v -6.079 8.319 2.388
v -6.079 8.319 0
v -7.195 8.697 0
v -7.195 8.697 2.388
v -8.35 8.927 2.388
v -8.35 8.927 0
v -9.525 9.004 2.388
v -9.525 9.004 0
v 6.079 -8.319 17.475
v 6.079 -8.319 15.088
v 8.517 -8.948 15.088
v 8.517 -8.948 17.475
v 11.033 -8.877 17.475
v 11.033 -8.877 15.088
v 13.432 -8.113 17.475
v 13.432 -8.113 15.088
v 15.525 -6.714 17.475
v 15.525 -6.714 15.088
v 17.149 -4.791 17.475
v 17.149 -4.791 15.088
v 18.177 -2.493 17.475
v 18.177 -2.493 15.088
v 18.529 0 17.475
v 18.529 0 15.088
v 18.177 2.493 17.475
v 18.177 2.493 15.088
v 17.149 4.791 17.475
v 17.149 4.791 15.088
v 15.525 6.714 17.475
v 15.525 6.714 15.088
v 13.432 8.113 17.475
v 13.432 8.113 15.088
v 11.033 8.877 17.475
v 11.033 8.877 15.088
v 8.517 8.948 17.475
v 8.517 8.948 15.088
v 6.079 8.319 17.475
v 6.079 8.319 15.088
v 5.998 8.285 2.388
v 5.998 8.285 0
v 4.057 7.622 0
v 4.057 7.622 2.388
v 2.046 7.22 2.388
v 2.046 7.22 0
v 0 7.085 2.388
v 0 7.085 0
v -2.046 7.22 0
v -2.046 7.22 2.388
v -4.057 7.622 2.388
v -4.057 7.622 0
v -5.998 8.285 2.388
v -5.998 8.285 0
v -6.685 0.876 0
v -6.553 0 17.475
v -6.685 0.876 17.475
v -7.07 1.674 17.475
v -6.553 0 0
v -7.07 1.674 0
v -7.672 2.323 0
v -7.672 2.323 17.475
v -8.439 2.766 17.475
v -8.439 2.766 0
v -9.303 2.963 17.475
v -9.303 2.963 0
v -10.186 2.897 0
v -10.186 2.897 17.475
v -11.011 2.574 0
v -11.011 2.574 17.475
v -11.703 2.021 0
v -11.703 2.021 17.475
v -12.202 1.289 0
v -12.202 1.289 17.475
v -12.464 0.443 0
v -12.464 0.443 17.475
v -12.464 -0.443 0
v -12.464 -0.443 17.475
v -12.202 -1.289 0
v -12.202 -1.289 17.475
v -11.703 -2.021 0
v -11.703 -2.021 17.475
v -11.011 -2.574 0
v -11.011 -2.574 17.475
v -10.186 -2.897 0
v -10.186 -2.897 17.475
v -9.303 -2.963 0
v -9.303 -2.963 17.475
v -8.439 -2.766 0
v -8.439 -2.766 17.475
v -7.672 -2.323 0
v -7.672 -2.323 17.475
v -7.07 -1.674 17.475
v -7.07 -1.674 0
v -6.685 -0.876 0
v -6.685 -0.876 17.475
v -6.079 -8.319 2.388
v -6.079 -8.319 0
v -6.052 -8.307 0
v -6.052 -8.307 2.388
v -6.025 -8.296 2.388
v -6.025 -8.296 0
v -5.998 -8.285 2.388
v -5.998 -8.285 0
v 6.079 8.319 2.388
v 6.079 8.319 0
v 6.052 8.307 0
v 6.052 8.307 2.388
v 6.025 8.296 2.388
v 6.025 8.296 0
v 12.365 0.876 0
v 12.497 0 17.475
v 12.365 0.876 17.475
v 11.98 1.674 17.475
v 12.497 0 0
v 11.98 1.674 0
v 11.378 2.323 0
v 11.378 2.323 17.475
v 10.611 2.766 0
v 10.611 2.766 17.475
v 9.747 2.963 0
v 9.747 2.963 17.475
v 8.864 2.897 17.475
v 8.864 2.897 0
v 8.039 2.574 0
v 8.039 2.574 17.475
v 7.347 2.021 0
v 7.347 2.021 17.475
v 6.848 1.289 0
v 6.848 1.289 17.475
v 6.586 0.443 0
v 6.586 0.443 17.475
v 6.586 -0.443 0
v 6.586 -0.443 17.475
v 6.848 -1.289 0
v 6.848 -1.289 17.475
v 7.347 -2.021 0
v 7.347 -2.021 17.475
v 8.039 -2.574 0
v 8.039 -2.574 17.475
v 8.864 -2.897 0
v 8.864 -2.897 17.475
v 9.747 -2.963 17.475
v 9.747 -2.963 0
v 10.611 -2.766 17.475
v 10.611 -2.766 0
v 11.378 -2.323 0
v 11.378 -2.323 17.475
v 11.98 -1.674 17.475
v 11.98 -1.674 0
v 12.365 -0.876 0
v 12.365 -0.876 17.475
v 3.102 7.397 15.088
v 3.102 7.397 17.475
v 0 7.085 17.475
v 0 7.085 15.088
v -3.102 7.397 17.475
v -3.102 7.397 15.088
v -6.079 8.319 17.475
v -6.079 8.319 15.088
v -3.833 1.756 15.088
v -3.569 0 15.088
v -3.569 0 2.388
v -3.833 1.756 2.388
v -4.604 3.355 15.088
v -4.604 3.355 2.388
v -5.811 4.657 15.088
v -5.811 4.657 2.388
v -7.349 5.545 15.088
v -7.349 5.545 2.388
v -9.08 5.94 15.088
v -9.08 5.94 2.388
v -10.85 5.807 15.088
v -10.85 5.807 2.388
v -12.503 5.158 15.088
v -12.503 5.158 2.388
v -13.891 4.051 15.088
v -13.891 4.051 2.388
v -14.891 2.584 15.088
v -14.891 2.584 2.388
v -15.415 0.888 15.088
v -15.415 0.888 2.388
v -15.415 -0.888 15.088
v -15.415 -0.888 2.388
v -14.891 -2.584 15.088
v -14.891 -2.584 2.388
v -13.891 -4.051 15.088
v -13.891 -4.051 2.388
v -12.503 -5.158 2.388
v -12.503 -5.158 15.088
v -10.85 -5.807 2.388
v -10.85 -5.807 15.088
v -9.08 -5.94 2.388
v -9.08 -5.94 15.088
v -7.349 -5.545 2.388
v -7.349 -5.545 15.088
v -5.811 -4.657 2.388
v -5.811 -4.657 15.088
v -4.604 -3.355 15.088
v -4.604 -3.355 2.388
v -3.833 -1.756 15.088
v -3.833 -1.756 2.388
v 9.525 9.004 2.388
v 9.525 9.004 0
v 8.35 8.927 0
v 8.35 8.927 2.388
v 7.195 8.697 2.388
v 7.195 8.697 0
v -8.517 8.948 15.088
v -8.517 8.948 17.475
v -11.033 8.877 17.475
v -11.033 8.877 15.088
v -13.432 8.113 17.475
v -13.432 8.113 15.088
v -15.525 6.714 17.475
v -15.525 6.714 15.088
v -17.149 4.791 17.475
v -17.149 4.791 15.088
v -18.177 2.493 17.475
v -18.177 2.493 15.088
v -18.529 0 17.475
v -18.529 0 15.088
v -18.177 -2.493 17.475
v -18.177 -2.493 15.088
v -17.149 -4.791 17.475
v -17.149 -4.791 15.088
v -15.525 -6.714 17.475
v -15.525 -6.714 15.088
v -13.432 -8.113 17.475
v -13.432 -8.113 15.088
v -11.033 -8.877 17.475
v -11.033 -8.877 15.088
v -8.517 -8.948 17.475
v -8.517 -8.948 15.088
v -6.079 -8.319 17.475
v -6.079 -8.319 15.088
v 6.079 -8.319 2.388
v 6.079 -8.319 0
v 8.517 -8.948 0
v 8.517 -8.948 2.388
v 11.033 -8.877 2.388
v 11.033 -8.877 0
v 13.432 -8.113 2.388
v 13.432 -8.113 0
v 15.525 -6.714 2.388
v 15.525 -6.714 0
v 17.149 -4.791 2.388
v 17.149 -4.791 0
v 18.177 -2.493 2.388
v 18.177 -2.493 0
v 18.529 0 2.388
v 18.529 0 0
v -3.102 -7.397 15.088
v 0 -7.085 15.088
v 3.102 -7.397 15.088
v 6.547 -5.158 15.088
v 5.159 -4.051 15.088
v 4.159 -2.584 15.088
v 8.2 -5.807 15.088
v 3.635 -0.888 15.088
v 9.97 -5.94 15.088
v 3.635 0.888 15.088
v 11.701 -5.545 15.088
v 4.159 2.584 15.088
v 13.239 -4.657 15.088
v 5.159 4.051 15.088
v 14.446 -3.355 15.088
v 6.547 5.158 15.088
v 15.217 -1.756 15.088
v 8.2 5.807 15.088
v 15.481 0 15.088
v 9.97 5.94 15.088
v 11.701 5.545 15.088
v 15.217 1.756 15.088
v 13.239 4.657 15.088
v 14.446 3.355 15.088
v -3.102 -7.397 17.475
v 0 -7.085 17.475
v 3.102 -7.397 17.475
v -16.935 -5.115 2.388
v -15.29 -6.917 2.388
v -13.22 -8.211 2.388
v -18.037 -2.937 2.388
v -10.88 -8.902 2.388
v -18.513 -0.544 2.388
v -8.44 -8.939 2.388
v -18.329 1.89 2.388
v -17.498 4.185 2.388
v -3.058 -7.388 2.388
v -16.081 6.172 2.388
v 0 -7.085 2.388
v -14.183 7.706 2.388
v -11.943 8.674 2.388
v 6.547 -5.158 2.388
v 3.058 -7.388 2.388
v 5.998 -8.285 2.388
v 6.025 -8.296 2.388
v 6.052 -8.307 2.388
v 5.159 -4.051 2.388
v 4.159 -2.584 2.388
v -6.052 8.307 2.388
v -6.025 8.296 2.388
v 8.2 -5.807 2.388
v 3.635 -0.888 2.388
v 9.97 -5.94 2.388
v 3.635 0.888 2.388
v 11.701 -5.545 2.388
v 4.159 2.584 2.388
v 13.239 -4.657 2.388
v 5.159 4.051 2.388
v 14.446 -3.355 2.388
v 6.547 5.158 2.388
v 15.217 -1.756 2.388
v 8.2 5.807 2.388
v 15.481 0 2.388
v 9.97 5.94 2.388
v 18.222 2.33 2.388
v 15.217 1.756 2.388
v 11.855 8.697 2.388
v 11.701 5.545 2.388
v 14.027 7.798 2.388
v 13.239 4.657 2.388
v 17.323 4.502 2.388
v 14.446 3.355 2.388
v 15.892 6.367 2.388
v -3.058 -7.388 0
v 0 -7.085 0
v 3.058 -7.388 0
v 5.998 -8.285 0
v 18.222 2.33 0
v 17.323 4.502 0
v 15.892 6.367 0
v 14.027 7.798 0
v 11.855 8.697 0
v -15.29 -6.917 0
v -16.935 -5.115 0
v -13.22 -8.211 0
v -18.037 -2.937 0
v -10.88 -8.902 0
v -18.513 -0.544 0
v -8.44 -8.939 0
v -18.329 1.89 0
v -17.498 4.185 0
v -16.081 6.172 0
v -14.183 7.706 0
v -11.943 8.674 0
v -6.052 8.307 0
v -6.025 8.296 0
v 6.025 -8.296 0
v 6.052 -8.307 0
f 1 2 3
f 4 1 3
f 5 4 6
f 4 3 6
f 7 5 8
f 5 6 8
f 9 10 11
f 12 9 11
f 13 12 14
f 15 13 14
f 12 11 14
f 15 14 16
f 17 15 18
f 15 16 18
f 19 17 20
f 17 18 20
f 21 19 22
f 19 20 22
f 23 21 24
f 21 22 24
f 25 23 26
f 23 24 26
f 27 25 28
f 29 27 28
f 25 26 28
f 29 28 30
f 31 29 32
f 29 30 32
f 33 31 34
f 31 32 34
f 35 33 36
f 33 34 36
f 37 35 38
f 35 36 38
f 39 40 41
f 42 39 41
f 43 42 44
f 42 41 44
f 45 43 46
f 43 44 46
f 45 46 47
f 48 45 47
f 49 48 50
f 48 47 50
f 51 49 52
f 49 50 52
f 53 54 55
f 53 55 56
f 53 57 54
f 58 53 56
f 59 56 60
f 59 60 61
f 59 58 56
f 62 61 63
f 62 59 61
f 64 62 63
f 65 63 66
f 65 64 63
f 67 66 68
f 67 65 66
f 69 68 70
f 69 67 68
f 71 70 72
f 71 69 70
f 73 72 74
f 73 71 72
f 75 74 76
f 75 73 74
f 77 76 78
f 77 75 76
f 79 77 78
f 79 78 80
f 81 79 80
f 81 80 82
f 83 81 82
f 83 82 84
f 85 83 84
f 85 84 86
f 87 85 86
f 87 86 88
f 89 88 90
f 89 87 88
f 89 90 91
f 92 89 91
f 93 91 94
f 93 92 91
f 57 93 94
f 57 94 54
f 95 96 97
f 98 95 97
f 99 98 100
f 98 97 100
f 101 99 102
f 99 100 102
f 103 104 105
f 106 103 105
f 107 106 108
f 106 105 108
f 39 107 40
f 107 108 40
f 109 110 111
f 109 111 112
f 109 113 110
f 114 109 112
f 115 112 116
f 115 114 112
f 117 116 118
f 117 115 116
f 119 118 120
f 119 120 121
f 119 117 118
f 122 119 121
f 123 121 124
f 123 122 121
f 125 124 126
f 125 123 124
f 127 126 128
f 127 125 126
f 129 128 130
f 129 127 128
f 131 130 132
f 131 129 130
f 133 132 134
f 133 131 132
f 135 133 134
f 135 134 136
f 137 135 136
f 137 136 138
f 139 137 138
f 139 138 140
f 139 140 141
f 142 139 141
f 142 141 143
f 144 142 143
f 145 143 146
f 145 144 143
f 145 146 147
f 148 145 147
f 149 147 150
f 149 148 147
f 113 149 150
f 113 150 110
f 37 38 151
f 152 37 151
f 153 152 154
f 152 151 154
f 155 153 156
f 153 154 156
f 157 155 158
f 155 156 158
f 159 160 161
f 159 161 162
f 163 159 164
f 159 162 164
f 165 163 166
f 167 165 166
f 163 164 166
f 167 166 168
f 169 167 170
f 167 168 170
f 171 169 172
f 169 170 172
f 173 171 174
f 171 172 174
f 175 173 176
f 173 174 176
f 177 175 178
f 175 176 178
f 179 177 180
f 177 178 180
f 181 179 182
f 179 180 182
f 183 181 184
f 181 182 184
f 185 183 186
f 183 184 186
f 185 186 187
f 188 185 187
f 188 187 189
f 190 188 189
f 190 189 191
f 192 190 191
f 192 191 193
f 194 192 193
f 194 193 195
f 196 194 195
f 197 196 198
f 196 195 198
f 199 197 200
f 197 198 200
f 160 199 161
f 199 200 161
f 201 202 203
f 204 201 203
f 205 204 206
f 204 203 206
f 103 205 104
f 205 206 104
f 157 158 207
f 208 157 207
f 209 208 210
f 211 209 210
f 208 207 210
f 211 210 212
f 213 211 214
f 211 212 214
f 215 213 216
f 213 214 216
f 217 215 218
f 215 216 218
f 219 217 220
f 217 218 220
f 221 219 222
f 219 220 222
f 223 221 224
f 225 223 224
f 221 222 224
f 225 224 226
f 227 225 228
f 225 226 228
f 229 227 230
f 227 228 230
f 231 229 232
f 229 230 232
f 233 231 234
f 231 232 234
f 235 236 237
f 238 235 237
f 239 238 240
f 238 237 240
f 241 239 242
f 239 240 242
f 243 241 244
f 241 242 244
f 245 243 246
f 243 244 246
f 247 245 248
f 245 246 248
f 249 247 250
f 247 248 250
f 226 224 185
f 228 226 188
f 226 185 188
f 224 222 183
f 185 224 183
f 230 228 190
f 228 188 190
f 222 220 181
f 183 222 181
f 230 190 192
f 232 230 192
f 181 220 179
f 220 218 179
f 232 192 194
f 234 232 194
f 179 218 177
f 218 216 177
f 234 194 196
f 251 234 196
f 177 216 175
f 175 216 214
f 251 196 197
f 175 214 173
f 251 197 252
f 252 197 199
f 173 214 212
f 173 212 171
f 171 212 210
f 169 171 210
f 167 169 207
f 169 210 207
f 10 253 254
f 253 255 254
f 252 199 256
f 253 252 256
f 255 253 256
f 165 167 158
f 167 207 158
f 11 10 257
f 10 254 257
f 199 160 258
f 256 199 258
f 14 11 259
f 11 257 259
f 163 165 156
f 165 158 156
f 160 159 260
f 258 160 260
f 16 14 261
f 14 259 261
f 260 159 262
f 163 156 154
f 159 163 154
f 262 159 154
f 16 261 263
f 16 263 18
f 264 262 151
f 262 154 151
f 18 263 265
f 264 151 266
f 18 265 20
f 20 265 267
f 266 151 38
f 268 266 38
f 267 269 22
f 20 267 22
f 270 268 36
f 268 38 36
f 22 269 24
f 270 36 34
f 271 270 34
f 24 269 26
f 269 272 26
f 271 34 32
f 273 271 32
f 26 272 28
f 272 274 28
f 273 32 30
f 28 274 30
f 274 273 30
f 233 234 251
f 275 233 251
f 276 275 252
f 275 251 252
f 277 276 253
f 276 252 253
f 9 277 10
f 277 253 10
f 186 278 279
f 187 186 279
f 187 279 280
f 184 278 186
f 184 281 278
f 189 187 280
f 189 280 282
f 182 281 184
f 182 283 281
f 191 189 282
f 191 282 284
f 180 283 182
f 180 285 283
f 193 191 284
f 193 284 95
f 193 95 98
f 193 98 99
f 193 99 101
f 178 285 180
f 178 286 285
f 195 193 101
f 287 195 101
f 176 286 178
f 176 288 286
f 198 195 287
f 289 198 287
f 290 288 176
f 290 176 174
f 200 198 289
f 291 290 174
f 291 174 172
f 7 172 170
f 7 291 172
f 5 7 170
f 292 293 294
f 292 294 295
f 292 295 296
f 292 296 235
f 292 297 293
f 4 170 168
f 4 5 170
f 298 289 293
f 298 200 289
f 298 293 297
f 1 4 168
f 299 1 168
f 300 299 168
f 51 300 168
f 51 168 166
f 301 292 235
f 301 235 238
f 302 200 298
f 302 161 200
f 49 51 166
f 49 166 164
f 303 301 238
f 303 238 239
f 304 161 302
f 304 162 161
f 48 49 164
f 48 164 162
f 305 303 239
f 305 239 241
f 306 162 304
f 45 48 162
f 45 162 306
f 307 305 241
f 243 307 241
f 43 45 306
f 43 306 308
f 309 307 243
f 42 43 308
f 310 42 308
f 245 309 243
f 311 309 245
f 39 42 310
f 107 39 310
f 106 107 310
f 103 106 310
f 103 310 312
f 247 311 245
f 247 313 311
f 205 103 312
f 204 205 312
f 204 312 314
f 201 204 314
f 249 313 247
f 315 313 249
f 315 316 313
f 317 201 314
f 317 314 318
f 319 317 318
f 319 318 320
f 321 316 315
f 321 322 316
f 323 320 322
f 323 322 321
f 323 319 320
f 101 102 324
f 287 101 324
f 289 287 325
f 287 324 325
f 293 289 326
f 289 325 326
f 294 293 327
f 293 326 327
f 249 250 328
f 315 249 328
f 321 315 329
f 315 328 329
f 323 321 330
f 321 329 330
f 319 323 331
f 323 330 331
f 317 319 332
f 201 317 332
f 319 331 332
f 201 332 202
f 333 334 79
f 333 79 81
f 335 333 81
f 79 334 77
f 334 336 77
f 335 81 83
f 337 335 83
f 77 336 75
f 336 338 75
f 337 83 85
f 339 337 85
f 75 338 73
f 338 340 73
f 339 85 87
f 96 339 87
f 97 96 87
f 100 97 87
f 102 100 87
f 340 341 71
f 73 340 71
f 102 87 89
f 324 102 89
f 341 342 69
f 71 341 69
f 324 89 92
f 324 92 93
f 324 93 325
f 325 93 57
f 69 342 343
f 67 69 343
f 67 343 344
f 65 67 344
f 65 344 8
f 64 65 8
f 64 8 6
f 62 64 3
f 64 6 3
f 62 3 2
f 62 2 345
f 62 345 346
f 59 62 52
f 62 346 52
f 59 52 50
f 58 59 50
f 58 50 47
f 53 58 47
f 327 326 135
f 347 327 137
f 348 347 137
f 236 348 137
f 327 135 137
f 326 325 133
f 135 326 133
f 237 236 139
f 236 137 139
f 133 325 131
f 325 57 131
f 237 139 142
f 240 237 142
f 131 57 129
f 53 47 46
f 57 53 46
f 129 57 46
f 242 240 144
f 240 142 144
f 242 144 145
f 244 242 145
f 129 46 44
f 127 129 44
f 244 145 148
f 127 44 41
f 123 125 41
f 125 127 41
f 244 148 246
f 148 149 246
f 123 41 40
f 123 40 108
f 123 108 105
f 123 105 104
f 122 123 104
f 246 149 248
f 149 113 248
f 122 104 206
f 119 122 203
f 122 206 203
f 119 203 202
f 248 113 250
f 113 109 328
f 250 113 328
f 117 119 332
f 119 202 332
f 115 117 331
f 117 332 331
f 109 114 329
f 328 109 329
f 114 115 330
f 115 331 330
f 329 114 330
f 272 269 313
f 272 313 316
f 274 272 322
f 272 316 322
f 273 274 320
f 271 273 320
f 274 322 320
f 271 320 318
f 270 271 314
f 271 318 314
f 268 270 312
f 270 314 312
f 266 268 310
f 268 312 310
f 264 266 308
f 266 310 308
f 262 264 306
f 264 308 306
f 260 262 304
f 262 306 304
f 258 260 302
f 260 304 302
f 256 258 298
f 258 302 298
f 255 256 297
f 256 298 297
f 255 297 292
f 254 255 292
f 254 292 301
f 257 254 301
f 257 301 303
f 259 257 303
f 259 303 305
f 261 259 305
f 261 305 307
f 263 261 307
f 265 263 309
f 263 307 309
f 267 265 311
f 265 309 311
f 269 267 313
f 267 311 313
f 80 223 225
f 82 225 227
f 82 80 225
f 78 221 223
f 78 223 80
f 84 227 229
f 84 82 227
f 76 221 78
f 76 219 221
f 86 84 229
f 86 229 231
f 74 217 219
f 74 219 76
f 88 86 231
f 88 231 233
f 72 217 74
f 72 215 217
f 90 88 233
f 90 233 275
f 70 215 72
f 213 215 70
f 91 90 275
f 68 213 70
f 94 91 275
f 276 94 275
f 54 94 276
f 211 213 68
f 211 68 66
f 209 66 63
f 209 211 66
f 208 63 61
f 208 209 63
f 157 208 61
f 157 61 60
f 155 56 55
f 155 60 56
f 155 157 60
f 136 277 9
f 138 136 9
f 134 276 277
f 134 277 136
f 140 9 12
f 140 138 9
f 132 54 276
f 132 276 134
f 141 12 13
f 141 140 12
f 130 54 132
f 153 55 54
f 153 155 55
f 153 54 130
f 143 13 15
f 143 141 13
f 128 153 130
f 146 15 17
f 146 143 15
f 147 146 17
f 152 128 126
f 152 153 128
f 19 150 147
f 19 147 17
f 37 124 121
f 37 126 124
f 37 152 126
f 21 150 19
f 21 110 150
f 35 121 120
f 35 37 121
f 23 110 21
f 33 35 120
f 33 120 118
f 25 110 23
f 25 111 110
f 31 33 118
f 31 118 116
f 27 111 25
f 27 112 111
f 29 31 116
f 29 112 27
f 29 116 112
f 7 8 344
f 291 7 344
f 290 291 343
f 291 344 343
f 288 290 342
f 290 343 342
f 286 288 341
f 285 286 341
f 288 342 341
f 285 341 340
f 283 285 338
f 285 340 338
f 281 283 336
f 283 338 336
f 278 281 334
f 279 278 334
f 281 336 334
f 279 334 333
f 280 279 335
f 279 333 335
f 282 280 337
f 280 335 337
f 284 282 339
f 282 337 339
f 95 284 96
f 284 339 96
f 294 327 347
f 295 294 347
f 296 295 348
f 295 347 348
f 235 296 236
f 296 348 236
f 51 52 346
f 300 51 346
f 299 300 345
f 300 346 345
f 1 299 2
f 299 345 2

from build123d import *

# Parameters (mm, degrees)
SKETCH1_R           = 2.9718
BOSS_EXTRUDE1_DEPTH = 2.3876
SKETCH2_R           = 5.9563
SKETCH2_R_2         = 2.9718
BOSS_EXTRUDE2_DEPTH = 12.7
SKETCH3_R           = 2.9718
BOSS_EXTRUDE3_DEPTH = 2.3876


with BuildPart() as part:
    # Sketch1 → Boss-Extrude1 (new body)
    # profile 1 of 7: a face of its own
    with BuildSketch(Plane.XY):
        with BuildLine():
            Line((-5.02285, 4.50215), (-9.525, 9.0043))
            ThreePointArc((-9.525, 9.0043), (-18.3562849, -1.756651787), (-6.07920357, -8.318888475))
            ThreePointArc((-6.07920357, -8.318888475), (-6.038523344, -8.30173624), (-5.997794724, -8.284699236))
            ThreePointArc((-5.997794724, -8.284699236), (-2.013760656, -4.965752915), (-0.5207, 0))
            Line((-0.5207, 0), (-5.02285, 4.50215))
        make_face()
        with Locations((-9.525, 0)):
            Circle(SKETCH1_R, mode=Mode.SUBTRACT)
    # profile 2 of 7: a face of its own
    with BuildSketch(Plane.XY):
        with BuildLine():
            ThreePointArc((-6.07920357, 8.318888475), (-7.768348213, 8.8312849), (-9.525, 9.0043))
            Line((-9.525, 9.0043), (-5.02285, 4.50215))
            Line((-5.02285, 4.50215), (-3.15799841, 6.36700159))
            ThreePointArc((-3.15799841, 6.36700159), (-4.485831076, 7.462184335), (-5.997794724, 8.284699236))
            ThreePointArc((-5.997794724, 8.284699236), (-6.038523344, 8.30173624), (-6.07920357, 8.318888475))
        make_face()
    # profile 3 of 7: a face of its own
    with BuildSketch(Plane.XY):
        with BuildLine():
            ThreePointArc((-3.15799841, 6.36700159), (-1.206111525, 3.44579643), (-0.5207, 0))
            ThreePointArc((-0.5207, 0), (-2.013760656, -4.965752915), (-5.997794724, -8.284699236))
            ThreePointArc((-5.997794724, -8.284699236), (0, -7.08520242), (5.997794724, -8.284699236))
            ThreePointArc((5.997794724, -8.284699236), (0.685208337, -1.713330628), (3.15799841, 6.36700159))
            Line((3.15799841, 6.36700159), (0, 6.36700159))
            Line((0, 6.36700159), (-3.15799841, 6.36700159))
        make_face()
    # profile 4 of 7: a face of its own
    with BuildSketch(Plane.XY):
        with BuildLine():
            Line((-3.15799841, 6.36700159), (-5.02285, 4.50215))
            Line((-5.02285, 4.50215), (-0.5207, 0))
            ThreePointArc((-0.5207, 0), (-1.206111525, 3.44579643), (-3.15799841, 6.36700159))
        make_face()
    # profile 5 of 7: a face of its own
    with BuildSketch(Plane.XY):
        with BuildLine():
            ThreePointArc((-5.997794724, 8.284699236), (-4.485831076, 7.462184335), (-3.15799841, 6.36700159))
            Line((-3.15799841, 6.36700159), (0, 6.36700159))
            Line((0, 6.36700159), (0, 7.08520242))
            ThreePointArc((0, 7.08520242), (-3.058281141, 7.388016551), (-5.997794724, 8.284699236))
        make_face()
    # profile 6 of 7: a face of its own
    with BuildSketch(Plane.XY):
        with BuildLine():
            ThreePointArc((5.997794724, 8.284699236), (3.058281141, 7.388016551), (0, 7.08520242))
            Line((0, 7.08520242), (0, 6.36700159))
            Line((0, 6.36700159), (3.15799841, 6.36700159))
            ThreePointArc((3.15799841, 6.36700159), (4.485831076, 7.462184335), (5.997794724, 8.284699236))
        make_face()
    # profile 7 of 7: a face of its own
    with BuildSketch(Plane.XY):
        with BuildLine():
            ThreePointArc((18.5293, 0), (15.89200159, 6.36700159), (9.525, 9.0043))
            ThreePointArc((9.525, 9.0043), (7.768348213, 8.8312849), (6.07920357, 8.318888475))
            ThreePointArc((6.07920357, 8.318888475), (6.038523344, 8.30173624), (5.997794724, 8.284699236))
            ThreePointArc((5.997794724, 8.284699236), (4.485831076, 7.462184335), (3.15799841, 6.36700159))
            ThreePointArc((3.15799841, 6.36700159), (0.685208337, -1.713330628), (5.997794724, -8.284699236))
            ThreePointArc((5.997794724, -8.284699236), (6.038523344, -8.30173624), (6.07920357, -8.318888475))
            ThreePointArc((6.07920357, -8.318888475), (14.527521049, -7.48680183), (18.5293, 0))
        make_face()
        with Locations((9.525, 0)):
            Circle(SKETCH1_R, mode=Mode.SUBTRACT)
    extrude(amount=BOSS_EXTRUDE1_DEPTH)

    # Sketch2 → Boss-Extrude2 (add)
    # profile 1 of 2: a face of its own
    with BuildSketch(Plane.XY.offset(2.3876)):
        with Locations((9.525, 0)):
            Circle(SKETCH2_R)
        with Locations((9.525, 0)):
            Circle(SKETCH2_R_2, mode=Mode.SUBTRACT)
    # profile 2 of 2: a face of its own
    with BuildSketch(Plane.XY.offset(2.3876)):
        with Locations((-9.525, 0)):
            Circle(SKETCH2_R)
        with Locations((-9.525, 0)):
            Circle(SKETCH2_R_2, mode=Mode.SUBTRACT)
    extrude(amount=BOSS_EXTRUDE2_DEPTH)

    # Sketch3 → Boss-Extrude3 (add)
    with BuildSketch(Plane.XY.offset(15.0876)):
        with BuildLine():
            ThreePointArc((6.07920357, -8.318888475), (18.5293, 0), (6.07920357, 8.318888475))
            ThreePointArc((6.07920357, 8.318888475), (0, 7.08520242), (-6.07920357, 8.318888475))
            ThreePointArc((-6.07920357, 8.318888475), (-18.5293, 0), (-6.07920357, -8.318888475))
            ThreePointArc((-6.07920357, -8.318888475), (0, -7.08520242), (6.07920357, -8.318888475))
        make_face()
        with Locations((-9.525, 0)):
            Circle(SKETCH3_R, mode=Mode.SUBTRACT)
        with Locations((9.525, 0)):
            Circle(SKETCH3_R, mode=Mode.SUBTRACT)
    extrude(amount=BOSS_EXTRUDE3_DEPTH)


solid = part.part
